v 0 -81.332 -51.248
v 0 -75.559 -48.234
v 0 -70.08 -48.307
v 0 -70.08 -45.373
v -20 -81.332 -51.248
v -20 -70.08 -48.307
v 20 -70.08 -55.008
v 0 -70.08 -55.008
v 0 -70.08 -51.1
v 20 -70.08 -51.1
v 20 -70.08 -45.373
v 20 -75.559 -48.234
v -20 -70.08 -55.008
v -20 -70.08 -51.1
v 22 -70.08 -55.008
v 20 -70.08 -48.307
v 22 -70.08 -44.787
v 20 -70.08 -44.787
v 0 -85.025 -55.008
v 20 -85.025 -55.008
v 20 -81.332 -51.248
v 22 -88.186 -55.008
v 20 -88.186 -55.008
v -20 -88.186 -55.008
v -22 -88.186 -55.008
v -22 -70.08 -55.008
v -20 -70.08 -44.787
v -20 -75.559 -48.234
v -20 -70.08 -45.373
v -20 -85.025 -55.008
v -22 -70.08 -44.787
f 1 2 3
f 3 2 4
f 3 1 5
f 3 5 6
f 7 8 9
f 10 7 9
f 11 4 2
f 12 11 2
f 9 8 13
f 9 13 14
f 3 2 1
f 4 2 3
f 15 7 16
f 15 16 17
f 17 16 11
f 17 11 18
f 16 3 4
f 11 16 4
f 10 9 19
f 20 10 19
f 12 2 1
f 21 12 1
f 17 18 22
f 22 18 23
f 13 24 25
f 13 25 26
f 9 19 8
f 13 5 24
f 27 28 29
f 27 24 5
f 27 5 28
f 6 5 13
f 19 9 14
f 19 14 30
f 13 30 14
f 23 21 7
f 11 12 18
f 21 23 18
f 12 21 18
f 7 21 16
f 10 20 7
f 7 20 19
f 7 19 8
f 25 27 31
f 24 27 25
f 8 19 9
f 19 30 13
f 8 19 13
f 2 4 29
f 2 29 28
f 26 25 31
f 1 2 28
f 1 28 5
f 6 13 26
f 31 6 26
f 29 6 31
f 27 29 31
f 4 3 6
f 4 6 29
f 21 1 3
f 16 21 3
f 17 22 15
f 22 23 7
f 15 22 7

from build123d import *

# Parameters (mm, degrees)
F1_DEPTH = 20
F3_DEPTH = 2


with BuildPart() as f1:
    # F0 (on Right) → F1 (new body)
    with BuildSketch(Plane.YZ):
        Polygon((-70.0796197427, -51.1001968513), (-85.0251993612, -55.0076276596), (-75.5720644497, -55.0076276596), (-75.5589757706, -55.0076276596), (-70.0796197427, -55.0076276596), align=None)
    extrude(amount=F1_DEPTH)


with BuildPart() as f1b:
    # F0 (on Right) → F1, piece 2 (new body)
    with BuildSketch(Plane.YZ):
        Polygon((-81.3316421735, -51.2483594349), (-70.0796197427, -48.3065866685), (-70.0796197427, -45.3729931479), (-75.5589757706, -48.234098685), (-75.5589757706, -48.3106762914), align=None)
        Polygon((-75.5589757706, -48.234098685), (-81.3316421735, -51.2483594349), (-75.5589757706, -48.3106762914), align=None)
    extrude(amount=F1_DEPTH)

    # F2 (on face) → F3 (join)
    with BuildSketch(Plane.YZ.offset(20)):
        Polygon((-88.1861992102, -55.0076276596), (-70.0796197427, -55.0076276596), (-70.0796197427, -44.786806123), align=None)
    extrude(amount=F3_DEPTH)


with BuildPart() as f4_1:
    # F4: instance of F1
    add(f1.part.mirror(Plane.YZ))


with BuildPart() as f4_2:
    # F4: instance of F1b
    add(f1b.part.mirror(Plane.YZ))


solid = Compound([f1.part, f1b.part, f4_1.part, f4_2.part])
